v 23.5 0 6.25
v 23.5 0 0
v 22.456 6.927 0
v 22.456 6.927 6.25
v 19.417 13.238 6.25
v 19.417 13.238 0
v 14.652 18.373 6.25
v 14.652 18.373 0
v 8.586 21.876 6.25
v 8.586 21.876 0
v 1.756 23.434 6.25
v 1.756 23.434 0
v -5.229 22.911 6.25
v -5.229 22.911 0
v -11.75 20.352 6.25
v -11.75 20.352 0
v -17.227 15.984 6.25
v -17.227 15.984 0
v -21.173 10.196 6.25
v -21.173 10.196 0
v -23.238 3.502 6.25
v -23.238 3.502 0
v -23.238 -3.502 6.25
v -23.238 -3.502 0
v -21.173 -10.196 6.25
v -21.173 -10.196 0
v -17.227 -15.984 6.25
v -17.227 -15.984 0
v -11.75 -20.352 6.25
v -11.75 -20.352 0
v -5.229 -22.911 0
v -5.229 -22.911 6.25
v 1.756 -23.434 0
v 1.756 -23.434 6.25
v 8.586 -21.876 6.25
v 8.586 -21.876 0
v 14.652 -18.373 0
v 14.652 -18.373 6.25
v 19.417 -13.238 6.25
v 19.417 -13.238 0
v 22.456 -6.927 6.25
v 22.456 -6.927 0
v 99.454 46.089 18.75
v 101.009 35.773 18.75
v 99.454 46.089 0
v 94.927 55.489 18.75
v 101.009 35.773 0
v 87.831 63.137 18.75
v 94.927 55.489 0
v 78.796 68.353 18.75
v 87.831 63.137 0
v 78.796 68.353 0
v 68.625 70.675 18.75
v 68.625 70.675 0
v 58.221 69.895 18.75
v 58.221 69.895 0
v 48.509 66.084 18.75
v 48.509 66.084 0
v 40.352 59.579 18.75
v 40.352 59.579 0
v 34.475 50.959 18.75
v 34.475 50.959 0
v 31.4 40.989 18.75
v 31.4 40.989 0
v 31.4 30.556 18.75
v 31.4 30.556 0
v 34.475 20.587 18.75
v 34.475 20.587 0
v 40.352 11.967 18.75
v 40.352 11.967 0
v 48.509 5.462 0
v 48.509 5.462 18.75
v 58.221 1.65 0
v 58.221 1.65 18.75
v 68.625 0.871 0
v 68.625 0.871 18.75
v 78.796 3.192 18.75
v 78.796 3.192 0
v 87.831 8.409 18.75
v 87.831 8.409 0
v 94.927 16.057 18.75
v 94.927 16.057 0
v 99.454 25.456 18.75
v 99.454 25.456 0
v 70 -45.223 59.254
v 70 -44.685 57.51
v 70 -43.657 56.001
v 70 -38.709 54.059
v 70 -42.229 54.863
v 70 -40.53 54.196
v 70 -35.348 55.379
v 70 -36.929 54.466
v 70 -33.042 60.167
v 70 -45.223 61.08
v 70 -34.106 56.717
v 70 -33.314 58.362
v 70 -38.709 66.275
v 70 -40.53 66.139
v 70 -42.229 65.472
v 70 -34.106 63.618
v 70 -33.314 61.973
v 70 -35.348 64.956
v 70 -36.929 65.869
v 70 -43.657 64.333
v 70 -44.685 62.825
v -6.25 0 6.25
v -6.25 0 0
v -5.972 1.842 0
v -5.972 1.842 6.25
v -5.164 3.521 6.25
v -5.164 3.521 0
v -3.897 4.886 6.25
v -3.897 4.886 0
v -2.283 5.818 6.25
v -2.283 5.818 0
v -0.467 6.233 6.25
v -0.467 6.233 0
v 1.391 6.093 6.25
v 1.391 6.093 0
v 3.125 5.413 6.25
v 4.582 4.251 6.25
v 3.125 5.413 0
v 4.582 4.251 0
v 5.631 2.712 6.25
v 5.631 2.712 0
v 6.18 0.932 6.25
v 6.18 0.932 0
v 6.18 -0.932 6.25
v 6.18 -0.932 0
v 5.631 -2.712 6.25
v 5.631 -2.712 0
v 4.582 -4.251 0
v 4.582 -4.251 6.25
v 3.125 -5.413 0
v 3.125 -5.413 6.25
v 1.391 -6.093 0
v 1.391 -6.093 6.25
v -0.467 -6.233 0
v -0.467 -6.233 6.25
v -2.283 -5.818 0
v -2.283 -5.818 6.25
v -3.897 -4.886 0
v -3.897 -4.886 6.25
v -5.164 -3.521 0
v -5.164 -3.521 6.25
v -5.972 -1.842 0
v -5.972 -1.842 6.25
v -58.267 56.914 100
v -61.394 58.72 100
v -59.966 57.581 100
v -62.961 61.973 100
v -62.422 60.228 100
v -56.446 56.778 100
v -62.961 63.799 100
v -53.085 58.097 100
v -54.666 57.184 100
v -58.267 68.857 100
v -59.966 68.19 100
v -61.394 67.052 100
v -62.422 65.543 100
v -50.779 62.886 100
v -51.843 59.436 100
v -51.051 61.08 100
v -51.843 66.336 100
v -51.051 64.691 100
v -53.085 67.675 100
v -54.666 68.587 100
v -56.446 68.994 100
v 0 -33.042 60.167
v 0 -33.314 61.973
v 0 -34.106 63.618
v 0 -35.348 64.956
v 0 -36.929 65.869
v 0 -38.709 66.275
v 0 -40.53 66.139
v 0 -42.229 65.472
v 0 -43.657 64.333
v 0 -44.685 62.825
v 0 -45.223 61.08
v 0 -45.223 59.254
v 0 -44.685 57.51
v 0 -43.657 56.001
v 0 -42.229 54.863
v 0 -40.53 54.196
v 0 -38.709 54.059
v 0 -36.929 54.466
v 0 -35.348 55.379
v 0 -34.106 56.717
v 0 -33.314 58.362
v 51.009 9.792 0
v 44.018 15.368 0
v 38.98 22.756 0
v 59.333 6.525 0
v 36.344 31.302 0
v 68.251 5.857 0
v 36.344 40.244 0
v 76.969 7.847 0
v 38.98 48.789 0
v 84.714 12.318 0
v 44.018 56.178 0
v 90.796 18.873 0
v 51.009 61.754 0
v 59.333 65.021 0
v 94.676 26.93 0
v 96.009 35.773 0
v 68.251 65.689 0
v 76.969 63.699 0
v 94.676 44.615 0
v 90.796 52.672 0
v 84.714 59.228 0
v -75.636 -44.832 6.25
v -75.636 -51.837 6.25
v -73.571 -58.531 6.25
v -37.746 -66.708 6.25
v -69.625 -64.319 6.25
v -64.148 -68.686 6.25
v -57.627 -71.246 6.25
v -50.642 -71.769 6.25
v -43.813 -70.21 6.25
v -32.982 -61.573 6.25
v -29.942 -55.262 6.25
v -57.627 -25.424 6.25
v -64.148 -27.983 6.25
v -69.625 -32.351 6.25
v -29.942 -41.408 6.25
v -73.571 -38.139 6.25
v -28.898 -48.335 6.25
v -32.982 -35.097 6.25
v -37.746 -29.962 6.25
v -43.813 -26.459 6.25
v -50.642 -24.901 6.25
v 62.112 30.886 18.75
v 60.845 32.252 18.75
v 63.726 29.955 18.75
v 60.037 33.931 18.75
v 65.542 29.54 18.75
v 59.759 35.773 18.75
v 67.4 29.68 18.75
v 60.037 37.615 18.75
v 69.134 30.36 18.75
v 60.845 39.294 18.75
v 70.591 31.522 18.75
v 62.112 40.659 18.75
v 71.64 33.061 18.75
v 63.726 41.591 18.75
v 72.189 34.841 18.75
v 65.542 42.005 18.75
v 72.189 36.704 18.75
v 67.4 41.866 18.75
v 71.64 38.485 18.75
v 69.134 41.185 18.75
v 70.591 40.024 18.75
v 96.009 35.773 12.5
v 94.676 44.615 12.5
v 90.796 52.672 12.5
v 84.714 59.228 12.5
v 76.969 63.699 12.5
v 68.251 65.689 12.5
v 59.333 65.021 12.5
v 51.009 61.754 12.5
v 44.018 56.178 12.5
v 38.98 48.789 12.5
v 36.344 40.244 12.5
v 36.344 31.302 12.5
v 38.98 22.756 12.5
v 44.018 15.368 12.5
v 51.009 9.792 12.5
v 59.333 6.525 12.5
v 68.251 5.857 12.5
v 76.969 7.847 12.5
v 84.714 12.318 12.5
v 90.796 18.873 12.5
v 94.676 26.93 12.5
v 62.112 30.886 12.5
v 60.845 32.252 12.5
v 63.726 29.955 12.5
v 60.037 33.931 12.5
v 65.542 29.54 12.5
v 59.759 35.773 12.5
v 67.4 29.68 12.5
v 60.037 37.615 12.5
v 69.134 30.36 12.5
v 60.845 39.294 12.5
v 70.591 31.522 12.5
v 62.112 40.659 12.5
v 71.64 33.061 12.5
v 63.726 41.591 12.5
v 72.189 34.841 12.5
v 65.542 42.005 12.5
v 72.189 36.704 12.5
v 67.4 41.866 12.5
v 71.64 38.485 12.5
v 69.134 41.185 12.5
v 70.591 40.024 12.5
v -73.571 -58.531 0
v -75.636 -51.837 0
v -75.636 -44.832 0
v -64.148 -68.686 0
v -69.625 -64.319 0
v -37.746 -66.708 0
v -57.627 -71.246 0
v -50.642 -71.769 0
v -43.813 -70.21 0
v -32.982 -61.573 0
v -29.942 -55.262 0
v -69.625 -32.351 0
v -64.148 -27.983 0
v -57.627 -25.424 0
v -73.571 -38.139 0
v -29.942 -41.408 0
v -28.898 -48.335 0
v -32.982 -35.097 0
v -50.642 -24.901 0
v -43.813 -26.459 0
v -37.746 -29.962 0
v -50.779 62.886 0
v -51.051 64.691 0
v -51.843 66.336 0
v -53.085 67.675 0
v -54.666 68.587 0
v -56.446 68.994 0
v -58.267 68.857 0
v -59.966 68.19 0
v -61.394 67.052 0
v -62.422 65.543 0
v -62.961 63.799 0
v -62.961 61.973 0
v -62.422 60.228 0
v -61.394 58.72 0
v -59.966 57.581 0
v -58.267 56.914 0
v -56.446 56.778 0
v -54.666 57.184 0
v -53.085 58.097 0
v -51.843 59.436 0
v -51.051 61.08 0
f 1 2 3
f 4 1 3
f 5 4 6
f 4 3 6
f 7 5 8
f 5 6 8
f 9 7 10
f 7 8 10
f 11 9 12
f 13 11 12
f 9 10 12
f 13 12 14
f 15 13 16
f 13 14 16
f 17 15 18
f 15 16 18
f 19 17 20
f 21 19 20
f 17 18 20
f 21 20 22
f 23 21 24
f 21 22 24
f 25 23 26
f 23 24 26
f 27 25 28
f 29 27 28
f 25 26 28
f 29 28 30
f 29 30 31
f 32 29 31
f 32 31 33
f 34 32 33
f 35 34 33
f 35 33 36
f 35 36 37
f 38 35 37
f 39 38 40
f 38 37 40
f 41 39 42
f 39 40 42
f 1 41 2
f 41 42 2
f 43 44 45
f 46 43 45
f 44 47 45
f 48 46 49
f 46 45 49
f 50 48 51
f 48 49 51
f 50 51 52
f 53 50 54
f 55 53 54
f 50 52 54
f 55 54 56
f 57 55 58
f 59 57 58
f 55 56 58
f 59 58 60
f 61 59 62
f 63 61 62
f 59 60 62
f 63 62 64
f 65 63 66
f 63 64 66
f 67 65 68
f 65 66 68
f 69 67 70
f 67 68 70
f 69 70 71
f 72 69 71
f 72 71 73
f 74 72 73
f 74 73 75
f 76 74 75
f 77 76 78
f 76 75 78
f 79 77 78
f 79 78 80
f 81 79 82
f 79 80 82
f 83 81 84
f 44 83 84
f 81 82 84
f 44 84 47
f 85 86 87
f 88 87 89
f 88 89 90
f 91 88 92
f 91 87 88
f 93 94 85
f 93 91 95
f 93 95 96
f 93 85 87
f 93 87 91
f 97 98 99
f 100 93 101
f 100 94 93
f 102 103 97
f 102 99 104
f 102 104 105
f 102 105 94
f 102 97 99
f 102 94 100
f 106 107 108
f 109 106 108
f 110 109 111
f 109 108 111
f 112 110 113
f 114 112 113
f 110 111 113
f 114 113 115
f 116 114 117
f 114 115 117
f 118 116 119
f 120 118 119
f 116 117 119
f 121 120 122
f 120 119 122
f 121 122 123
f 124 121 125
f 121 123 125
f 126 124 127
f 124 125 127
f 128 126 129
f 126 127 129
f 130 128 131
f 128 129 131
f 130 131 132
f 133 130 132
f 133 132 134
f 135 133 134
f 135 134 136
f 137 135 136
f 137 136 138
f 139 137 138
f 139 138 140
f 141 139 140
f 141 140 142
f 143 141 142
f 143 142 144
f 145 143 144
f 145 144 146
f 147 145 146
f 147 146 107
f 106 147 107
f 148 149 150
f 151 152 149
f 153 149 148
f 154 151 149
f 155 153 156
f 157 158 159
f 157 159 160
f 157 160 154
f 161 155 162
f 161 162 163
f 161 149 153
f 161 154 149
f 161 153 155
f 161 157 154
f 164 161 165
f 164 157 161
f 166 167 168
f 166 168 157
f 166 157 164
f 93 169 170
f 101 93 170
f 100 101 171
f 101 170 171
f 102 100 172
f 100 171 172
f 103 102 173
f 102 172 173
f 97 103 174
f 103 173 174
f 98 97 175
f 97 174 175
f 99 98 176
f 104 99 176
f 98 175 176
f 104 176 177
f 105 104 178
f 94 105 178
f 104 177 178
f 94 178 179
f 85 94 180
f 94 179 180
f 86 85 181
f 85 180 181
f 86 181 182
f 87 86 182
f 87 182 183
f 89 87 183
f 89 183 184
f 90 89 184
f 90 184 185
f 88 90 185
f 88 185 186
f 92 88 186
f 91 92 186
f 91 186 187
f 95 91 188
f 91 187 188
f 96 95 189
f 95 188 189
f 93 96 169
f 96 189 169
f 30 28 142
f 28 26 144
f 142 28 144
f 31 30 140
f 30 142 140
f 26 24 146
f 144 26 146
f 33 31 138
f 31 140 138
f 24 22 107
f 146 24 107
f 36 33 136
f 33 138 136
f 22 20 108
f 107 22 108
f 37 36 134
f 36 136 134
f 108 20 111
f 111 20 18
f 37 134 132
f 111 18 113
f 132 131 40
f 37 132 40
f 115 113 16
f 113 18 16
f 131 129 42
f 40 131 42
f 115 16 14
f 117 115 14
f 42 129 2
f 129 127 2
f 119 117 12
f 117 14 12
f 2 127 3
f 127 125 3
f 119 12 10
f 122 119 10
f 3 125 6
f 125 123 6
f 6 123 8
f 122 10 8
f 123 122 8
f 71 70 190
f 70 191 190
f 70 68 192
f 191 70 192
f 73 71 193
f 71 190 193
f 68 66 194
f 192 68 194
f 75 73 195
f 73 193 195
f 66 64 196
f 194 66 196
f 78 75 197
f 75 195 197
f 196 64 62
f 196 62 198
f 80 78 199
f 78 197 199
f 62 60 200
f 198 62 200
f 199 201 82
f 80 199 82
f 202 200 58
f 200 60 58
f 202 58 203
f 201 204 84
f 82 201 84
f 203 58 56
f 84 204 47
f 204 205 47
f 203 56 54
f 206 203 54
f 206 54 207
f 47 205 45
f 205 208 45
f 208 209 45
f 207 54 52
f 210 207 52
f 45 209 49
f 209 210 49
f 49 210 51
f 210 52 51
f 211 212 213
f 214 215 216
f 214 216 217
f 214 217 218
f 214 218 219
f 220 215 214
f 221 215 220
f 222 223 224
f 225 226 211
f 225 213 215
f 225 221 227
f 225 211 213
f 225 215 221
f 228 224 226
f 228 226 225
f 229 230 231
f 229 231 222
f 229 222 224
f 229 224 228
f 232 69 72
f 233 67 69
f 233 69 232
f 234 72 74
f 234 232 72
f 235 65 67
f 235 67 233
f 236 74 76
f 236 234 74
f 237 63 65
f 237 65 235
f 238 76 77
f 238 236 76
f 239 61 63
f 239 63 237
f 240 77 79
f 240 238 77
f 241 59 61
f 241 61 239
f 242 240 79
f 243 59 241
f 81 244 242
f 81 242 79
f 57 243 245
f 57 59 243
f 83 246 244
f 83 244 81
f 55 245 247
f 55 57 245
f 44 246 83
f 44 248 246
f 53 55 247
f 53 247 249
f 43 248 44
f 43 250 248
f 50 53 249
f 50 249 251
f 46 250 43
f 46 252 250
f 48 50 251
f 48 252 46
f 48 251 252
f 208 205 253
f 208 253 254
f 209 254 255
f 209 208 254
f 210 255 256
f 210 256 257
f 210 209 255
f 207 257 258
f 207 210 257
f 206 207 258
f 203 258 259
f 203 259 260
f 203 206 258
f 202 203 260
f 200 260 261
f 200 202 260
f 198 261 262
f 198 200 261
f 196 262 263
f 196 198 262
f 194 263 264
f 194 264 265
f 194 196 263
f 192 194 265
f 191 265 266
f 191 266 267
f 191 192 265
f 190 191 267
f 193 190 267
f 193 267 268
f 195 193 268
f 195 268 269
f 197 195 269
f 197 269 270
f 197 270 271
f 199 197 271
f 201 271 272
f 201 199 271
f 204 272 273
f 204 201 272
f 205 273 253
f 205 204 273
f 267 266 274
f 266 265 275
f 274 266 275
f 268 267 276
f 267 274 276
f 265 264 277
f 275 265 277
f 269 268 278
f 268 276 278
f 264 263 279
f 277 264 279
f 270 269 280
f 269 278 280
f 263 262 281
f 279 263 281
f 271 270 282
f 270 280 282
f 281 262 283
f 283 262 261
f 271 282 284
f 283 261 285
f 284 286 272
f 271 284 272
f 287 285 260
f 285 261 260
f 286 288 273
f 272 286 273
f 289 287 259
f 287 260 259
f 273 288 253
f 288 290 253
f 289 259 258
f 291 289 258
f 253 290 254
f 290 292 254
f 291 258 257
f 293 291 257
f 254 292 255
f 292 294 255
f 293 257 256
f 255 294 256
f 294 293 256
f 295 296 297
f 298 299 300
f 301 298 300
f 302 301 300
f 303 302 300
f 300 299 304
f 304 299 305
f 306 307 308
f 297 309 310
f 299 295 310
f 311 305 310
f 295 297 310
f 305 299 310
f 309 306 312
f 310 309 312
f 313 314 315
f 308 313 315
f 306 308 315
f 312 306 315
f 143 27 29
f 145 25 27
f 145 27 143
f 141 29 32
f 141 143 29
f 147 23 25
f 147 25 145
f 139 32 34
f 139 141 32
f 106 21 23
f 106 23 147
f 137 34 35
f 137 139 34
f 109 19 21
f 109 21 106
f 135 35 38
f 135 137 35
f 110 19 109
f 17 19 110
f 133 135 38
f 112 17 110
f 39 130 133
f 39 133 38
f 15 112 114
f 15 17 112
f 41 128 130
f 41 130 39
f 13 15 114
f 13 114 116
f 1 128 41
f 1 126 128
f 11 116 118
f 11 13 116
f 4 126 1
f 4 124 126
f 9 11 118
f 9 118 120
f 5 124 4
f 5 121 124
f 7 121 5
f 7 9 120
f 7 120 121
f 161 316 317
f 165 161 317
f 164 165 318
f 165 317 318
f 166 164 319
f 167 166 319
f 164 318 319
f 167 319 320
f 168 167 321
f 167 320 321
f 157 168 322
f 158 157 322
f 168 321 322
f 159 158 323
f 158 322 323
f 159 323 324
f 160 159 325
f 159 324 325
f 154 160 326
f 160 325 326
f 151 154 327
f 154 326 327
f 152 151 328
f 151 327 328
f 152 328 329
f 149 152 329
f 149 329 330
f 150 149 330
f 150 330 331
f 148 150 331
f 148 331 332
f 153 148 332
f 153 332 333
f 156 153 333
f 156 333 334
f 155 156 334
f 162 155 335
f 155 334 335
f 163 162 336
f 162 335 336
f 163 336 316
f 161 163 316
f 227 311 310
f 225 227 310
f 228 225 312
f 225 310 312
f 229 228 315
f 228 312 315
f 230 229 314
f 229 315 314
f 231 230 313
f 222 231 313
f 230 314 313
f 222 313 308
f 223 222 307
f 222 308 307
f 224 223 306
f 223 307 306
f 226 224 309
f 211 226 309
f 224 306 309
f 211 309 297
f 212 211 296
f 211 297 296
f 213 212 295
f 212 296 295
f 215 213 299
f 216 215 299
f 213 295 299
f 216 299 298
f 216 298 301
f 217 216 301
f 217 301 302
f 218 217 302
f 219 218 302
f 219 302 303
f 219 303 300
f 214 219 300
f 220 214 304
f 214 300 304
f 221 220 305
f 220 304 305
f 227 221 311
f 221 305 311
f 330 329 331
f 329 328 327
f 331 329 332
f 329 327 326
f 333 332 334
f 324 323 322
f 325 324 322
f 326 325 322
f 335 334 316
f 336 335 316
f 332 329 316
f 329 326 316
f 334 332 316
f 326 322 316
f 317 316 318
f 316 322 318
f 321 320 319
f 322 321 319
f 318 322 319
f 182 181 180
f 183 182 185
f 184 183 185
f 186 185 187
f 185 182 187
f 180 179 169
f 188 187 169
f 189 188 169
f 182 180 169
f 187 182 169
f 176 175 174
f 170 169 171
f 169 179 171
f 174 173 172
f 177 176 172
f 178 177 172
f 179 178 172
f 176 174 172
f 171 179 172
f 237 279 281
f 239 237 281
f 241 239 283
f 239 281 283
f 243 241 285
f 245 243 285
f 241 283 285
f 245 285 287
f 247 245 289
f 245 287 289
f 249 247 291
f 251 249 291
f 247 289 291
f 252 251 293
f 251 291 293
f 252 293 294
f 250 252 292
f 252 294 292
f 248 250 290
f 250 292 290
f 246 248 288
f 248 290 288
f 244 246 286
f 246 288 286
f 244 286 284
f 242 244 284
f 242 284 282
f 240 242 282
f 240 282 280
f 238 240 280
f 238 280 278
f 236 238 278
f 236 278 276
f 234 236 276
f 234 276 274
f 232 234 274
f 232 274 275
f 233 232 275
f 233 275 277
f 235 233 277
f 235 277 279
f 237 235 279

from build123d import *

# Parameters (mm, degrees)
F0_R      = 23.5
F1_DEPTH  = 6.25
F3_D      = 12.5
F0_R_2    = 35
F0_R_3    = 30
F4_DEPTH  = 12.5
F5_R      = 35
F5_R_2    = 30
F6_DEPTH  = 6.25
F8_D      = 12.5
F9_R      = 6.125
F10_DEPTH = 100
F11_R     = 6.125
F12_DEPTH = 70
F13_R     = 23.5
F14_DEPTH = 6.25


with BuildPart() as f1:
    # F0 (on Top) → F1 (new body)
    with BuildSketch(Plane.XY):
        Circle(F0_R)
    extrude(amount=F1_DEPTH)

    # F3 (through all)
    with Locations(Plane.XY.offset(6.25)):
        with Locations((0, 0)):
            Hole(F3_D / 2)


with BuildPart() as f4:
    # F0 (on Top) → F4 (new body)
    with BuildSketch(Plane.XY):
        with Locations((66.009066999, 35.7728339732)):
            Circle(F0_R_2)
        with Locations((66.009066999, 35.7728339732)):
            Circle(F0_R_3, mode=Mode.SUBTRACT)
    extrude(amount=F4_DEPTH)

    # F5 (on face) → F6 (join)
    with BuildSketch(Plane.XY.offset(12.5)):
        with Locations((66.009066999, 35.7728339732)):
            Circle(F5_R)
        with Locations((66.009066999, 35.7728339732)):
            Circle(F5_R_2, mode=Mode.SUBTRACT)
        with Locations((66.009066999, 35.7728339732)):
            Circle(F5_R_2)
    extrude(amount=F6_DEPTH)

    # F8 (through all)
    with Locations(Plane.XY.offset(18.75)):
        with Locations((66.009066999, 35.7728339732)):
            Hole(F8_D / 2)


with BuildPart() as f10:
    # F9 (on Top) → F10 (new body)
    with BuildSketch(Plane.XY):
        with Locations((-56.90395087, 62.8858730197)):
            Circle(F9_R)
    extrude(amount=F10_DEPTH)


with BuildPart() as f12:
    # F11 (on Right) → F12 (new body)
    with BuildSketch(Plane.YZ):
        with Locations((-39.1667149961, 60.1673088968)):
            Circle(F11_R)
    extrude(amount=F12_DEPTH)


with BuildPart() as f14:
    # F13 (on Top) → F14 (new body)
    with BuildSketch(Plane.XY):
        with Locations((-52.3981638253, -48.3348481357)):
            Circle(F13_R)
    extrude(amount=F14_DEPTH)


solid = Compound([f1.part, f4.part, f10.part, f12.part, f14.part])
